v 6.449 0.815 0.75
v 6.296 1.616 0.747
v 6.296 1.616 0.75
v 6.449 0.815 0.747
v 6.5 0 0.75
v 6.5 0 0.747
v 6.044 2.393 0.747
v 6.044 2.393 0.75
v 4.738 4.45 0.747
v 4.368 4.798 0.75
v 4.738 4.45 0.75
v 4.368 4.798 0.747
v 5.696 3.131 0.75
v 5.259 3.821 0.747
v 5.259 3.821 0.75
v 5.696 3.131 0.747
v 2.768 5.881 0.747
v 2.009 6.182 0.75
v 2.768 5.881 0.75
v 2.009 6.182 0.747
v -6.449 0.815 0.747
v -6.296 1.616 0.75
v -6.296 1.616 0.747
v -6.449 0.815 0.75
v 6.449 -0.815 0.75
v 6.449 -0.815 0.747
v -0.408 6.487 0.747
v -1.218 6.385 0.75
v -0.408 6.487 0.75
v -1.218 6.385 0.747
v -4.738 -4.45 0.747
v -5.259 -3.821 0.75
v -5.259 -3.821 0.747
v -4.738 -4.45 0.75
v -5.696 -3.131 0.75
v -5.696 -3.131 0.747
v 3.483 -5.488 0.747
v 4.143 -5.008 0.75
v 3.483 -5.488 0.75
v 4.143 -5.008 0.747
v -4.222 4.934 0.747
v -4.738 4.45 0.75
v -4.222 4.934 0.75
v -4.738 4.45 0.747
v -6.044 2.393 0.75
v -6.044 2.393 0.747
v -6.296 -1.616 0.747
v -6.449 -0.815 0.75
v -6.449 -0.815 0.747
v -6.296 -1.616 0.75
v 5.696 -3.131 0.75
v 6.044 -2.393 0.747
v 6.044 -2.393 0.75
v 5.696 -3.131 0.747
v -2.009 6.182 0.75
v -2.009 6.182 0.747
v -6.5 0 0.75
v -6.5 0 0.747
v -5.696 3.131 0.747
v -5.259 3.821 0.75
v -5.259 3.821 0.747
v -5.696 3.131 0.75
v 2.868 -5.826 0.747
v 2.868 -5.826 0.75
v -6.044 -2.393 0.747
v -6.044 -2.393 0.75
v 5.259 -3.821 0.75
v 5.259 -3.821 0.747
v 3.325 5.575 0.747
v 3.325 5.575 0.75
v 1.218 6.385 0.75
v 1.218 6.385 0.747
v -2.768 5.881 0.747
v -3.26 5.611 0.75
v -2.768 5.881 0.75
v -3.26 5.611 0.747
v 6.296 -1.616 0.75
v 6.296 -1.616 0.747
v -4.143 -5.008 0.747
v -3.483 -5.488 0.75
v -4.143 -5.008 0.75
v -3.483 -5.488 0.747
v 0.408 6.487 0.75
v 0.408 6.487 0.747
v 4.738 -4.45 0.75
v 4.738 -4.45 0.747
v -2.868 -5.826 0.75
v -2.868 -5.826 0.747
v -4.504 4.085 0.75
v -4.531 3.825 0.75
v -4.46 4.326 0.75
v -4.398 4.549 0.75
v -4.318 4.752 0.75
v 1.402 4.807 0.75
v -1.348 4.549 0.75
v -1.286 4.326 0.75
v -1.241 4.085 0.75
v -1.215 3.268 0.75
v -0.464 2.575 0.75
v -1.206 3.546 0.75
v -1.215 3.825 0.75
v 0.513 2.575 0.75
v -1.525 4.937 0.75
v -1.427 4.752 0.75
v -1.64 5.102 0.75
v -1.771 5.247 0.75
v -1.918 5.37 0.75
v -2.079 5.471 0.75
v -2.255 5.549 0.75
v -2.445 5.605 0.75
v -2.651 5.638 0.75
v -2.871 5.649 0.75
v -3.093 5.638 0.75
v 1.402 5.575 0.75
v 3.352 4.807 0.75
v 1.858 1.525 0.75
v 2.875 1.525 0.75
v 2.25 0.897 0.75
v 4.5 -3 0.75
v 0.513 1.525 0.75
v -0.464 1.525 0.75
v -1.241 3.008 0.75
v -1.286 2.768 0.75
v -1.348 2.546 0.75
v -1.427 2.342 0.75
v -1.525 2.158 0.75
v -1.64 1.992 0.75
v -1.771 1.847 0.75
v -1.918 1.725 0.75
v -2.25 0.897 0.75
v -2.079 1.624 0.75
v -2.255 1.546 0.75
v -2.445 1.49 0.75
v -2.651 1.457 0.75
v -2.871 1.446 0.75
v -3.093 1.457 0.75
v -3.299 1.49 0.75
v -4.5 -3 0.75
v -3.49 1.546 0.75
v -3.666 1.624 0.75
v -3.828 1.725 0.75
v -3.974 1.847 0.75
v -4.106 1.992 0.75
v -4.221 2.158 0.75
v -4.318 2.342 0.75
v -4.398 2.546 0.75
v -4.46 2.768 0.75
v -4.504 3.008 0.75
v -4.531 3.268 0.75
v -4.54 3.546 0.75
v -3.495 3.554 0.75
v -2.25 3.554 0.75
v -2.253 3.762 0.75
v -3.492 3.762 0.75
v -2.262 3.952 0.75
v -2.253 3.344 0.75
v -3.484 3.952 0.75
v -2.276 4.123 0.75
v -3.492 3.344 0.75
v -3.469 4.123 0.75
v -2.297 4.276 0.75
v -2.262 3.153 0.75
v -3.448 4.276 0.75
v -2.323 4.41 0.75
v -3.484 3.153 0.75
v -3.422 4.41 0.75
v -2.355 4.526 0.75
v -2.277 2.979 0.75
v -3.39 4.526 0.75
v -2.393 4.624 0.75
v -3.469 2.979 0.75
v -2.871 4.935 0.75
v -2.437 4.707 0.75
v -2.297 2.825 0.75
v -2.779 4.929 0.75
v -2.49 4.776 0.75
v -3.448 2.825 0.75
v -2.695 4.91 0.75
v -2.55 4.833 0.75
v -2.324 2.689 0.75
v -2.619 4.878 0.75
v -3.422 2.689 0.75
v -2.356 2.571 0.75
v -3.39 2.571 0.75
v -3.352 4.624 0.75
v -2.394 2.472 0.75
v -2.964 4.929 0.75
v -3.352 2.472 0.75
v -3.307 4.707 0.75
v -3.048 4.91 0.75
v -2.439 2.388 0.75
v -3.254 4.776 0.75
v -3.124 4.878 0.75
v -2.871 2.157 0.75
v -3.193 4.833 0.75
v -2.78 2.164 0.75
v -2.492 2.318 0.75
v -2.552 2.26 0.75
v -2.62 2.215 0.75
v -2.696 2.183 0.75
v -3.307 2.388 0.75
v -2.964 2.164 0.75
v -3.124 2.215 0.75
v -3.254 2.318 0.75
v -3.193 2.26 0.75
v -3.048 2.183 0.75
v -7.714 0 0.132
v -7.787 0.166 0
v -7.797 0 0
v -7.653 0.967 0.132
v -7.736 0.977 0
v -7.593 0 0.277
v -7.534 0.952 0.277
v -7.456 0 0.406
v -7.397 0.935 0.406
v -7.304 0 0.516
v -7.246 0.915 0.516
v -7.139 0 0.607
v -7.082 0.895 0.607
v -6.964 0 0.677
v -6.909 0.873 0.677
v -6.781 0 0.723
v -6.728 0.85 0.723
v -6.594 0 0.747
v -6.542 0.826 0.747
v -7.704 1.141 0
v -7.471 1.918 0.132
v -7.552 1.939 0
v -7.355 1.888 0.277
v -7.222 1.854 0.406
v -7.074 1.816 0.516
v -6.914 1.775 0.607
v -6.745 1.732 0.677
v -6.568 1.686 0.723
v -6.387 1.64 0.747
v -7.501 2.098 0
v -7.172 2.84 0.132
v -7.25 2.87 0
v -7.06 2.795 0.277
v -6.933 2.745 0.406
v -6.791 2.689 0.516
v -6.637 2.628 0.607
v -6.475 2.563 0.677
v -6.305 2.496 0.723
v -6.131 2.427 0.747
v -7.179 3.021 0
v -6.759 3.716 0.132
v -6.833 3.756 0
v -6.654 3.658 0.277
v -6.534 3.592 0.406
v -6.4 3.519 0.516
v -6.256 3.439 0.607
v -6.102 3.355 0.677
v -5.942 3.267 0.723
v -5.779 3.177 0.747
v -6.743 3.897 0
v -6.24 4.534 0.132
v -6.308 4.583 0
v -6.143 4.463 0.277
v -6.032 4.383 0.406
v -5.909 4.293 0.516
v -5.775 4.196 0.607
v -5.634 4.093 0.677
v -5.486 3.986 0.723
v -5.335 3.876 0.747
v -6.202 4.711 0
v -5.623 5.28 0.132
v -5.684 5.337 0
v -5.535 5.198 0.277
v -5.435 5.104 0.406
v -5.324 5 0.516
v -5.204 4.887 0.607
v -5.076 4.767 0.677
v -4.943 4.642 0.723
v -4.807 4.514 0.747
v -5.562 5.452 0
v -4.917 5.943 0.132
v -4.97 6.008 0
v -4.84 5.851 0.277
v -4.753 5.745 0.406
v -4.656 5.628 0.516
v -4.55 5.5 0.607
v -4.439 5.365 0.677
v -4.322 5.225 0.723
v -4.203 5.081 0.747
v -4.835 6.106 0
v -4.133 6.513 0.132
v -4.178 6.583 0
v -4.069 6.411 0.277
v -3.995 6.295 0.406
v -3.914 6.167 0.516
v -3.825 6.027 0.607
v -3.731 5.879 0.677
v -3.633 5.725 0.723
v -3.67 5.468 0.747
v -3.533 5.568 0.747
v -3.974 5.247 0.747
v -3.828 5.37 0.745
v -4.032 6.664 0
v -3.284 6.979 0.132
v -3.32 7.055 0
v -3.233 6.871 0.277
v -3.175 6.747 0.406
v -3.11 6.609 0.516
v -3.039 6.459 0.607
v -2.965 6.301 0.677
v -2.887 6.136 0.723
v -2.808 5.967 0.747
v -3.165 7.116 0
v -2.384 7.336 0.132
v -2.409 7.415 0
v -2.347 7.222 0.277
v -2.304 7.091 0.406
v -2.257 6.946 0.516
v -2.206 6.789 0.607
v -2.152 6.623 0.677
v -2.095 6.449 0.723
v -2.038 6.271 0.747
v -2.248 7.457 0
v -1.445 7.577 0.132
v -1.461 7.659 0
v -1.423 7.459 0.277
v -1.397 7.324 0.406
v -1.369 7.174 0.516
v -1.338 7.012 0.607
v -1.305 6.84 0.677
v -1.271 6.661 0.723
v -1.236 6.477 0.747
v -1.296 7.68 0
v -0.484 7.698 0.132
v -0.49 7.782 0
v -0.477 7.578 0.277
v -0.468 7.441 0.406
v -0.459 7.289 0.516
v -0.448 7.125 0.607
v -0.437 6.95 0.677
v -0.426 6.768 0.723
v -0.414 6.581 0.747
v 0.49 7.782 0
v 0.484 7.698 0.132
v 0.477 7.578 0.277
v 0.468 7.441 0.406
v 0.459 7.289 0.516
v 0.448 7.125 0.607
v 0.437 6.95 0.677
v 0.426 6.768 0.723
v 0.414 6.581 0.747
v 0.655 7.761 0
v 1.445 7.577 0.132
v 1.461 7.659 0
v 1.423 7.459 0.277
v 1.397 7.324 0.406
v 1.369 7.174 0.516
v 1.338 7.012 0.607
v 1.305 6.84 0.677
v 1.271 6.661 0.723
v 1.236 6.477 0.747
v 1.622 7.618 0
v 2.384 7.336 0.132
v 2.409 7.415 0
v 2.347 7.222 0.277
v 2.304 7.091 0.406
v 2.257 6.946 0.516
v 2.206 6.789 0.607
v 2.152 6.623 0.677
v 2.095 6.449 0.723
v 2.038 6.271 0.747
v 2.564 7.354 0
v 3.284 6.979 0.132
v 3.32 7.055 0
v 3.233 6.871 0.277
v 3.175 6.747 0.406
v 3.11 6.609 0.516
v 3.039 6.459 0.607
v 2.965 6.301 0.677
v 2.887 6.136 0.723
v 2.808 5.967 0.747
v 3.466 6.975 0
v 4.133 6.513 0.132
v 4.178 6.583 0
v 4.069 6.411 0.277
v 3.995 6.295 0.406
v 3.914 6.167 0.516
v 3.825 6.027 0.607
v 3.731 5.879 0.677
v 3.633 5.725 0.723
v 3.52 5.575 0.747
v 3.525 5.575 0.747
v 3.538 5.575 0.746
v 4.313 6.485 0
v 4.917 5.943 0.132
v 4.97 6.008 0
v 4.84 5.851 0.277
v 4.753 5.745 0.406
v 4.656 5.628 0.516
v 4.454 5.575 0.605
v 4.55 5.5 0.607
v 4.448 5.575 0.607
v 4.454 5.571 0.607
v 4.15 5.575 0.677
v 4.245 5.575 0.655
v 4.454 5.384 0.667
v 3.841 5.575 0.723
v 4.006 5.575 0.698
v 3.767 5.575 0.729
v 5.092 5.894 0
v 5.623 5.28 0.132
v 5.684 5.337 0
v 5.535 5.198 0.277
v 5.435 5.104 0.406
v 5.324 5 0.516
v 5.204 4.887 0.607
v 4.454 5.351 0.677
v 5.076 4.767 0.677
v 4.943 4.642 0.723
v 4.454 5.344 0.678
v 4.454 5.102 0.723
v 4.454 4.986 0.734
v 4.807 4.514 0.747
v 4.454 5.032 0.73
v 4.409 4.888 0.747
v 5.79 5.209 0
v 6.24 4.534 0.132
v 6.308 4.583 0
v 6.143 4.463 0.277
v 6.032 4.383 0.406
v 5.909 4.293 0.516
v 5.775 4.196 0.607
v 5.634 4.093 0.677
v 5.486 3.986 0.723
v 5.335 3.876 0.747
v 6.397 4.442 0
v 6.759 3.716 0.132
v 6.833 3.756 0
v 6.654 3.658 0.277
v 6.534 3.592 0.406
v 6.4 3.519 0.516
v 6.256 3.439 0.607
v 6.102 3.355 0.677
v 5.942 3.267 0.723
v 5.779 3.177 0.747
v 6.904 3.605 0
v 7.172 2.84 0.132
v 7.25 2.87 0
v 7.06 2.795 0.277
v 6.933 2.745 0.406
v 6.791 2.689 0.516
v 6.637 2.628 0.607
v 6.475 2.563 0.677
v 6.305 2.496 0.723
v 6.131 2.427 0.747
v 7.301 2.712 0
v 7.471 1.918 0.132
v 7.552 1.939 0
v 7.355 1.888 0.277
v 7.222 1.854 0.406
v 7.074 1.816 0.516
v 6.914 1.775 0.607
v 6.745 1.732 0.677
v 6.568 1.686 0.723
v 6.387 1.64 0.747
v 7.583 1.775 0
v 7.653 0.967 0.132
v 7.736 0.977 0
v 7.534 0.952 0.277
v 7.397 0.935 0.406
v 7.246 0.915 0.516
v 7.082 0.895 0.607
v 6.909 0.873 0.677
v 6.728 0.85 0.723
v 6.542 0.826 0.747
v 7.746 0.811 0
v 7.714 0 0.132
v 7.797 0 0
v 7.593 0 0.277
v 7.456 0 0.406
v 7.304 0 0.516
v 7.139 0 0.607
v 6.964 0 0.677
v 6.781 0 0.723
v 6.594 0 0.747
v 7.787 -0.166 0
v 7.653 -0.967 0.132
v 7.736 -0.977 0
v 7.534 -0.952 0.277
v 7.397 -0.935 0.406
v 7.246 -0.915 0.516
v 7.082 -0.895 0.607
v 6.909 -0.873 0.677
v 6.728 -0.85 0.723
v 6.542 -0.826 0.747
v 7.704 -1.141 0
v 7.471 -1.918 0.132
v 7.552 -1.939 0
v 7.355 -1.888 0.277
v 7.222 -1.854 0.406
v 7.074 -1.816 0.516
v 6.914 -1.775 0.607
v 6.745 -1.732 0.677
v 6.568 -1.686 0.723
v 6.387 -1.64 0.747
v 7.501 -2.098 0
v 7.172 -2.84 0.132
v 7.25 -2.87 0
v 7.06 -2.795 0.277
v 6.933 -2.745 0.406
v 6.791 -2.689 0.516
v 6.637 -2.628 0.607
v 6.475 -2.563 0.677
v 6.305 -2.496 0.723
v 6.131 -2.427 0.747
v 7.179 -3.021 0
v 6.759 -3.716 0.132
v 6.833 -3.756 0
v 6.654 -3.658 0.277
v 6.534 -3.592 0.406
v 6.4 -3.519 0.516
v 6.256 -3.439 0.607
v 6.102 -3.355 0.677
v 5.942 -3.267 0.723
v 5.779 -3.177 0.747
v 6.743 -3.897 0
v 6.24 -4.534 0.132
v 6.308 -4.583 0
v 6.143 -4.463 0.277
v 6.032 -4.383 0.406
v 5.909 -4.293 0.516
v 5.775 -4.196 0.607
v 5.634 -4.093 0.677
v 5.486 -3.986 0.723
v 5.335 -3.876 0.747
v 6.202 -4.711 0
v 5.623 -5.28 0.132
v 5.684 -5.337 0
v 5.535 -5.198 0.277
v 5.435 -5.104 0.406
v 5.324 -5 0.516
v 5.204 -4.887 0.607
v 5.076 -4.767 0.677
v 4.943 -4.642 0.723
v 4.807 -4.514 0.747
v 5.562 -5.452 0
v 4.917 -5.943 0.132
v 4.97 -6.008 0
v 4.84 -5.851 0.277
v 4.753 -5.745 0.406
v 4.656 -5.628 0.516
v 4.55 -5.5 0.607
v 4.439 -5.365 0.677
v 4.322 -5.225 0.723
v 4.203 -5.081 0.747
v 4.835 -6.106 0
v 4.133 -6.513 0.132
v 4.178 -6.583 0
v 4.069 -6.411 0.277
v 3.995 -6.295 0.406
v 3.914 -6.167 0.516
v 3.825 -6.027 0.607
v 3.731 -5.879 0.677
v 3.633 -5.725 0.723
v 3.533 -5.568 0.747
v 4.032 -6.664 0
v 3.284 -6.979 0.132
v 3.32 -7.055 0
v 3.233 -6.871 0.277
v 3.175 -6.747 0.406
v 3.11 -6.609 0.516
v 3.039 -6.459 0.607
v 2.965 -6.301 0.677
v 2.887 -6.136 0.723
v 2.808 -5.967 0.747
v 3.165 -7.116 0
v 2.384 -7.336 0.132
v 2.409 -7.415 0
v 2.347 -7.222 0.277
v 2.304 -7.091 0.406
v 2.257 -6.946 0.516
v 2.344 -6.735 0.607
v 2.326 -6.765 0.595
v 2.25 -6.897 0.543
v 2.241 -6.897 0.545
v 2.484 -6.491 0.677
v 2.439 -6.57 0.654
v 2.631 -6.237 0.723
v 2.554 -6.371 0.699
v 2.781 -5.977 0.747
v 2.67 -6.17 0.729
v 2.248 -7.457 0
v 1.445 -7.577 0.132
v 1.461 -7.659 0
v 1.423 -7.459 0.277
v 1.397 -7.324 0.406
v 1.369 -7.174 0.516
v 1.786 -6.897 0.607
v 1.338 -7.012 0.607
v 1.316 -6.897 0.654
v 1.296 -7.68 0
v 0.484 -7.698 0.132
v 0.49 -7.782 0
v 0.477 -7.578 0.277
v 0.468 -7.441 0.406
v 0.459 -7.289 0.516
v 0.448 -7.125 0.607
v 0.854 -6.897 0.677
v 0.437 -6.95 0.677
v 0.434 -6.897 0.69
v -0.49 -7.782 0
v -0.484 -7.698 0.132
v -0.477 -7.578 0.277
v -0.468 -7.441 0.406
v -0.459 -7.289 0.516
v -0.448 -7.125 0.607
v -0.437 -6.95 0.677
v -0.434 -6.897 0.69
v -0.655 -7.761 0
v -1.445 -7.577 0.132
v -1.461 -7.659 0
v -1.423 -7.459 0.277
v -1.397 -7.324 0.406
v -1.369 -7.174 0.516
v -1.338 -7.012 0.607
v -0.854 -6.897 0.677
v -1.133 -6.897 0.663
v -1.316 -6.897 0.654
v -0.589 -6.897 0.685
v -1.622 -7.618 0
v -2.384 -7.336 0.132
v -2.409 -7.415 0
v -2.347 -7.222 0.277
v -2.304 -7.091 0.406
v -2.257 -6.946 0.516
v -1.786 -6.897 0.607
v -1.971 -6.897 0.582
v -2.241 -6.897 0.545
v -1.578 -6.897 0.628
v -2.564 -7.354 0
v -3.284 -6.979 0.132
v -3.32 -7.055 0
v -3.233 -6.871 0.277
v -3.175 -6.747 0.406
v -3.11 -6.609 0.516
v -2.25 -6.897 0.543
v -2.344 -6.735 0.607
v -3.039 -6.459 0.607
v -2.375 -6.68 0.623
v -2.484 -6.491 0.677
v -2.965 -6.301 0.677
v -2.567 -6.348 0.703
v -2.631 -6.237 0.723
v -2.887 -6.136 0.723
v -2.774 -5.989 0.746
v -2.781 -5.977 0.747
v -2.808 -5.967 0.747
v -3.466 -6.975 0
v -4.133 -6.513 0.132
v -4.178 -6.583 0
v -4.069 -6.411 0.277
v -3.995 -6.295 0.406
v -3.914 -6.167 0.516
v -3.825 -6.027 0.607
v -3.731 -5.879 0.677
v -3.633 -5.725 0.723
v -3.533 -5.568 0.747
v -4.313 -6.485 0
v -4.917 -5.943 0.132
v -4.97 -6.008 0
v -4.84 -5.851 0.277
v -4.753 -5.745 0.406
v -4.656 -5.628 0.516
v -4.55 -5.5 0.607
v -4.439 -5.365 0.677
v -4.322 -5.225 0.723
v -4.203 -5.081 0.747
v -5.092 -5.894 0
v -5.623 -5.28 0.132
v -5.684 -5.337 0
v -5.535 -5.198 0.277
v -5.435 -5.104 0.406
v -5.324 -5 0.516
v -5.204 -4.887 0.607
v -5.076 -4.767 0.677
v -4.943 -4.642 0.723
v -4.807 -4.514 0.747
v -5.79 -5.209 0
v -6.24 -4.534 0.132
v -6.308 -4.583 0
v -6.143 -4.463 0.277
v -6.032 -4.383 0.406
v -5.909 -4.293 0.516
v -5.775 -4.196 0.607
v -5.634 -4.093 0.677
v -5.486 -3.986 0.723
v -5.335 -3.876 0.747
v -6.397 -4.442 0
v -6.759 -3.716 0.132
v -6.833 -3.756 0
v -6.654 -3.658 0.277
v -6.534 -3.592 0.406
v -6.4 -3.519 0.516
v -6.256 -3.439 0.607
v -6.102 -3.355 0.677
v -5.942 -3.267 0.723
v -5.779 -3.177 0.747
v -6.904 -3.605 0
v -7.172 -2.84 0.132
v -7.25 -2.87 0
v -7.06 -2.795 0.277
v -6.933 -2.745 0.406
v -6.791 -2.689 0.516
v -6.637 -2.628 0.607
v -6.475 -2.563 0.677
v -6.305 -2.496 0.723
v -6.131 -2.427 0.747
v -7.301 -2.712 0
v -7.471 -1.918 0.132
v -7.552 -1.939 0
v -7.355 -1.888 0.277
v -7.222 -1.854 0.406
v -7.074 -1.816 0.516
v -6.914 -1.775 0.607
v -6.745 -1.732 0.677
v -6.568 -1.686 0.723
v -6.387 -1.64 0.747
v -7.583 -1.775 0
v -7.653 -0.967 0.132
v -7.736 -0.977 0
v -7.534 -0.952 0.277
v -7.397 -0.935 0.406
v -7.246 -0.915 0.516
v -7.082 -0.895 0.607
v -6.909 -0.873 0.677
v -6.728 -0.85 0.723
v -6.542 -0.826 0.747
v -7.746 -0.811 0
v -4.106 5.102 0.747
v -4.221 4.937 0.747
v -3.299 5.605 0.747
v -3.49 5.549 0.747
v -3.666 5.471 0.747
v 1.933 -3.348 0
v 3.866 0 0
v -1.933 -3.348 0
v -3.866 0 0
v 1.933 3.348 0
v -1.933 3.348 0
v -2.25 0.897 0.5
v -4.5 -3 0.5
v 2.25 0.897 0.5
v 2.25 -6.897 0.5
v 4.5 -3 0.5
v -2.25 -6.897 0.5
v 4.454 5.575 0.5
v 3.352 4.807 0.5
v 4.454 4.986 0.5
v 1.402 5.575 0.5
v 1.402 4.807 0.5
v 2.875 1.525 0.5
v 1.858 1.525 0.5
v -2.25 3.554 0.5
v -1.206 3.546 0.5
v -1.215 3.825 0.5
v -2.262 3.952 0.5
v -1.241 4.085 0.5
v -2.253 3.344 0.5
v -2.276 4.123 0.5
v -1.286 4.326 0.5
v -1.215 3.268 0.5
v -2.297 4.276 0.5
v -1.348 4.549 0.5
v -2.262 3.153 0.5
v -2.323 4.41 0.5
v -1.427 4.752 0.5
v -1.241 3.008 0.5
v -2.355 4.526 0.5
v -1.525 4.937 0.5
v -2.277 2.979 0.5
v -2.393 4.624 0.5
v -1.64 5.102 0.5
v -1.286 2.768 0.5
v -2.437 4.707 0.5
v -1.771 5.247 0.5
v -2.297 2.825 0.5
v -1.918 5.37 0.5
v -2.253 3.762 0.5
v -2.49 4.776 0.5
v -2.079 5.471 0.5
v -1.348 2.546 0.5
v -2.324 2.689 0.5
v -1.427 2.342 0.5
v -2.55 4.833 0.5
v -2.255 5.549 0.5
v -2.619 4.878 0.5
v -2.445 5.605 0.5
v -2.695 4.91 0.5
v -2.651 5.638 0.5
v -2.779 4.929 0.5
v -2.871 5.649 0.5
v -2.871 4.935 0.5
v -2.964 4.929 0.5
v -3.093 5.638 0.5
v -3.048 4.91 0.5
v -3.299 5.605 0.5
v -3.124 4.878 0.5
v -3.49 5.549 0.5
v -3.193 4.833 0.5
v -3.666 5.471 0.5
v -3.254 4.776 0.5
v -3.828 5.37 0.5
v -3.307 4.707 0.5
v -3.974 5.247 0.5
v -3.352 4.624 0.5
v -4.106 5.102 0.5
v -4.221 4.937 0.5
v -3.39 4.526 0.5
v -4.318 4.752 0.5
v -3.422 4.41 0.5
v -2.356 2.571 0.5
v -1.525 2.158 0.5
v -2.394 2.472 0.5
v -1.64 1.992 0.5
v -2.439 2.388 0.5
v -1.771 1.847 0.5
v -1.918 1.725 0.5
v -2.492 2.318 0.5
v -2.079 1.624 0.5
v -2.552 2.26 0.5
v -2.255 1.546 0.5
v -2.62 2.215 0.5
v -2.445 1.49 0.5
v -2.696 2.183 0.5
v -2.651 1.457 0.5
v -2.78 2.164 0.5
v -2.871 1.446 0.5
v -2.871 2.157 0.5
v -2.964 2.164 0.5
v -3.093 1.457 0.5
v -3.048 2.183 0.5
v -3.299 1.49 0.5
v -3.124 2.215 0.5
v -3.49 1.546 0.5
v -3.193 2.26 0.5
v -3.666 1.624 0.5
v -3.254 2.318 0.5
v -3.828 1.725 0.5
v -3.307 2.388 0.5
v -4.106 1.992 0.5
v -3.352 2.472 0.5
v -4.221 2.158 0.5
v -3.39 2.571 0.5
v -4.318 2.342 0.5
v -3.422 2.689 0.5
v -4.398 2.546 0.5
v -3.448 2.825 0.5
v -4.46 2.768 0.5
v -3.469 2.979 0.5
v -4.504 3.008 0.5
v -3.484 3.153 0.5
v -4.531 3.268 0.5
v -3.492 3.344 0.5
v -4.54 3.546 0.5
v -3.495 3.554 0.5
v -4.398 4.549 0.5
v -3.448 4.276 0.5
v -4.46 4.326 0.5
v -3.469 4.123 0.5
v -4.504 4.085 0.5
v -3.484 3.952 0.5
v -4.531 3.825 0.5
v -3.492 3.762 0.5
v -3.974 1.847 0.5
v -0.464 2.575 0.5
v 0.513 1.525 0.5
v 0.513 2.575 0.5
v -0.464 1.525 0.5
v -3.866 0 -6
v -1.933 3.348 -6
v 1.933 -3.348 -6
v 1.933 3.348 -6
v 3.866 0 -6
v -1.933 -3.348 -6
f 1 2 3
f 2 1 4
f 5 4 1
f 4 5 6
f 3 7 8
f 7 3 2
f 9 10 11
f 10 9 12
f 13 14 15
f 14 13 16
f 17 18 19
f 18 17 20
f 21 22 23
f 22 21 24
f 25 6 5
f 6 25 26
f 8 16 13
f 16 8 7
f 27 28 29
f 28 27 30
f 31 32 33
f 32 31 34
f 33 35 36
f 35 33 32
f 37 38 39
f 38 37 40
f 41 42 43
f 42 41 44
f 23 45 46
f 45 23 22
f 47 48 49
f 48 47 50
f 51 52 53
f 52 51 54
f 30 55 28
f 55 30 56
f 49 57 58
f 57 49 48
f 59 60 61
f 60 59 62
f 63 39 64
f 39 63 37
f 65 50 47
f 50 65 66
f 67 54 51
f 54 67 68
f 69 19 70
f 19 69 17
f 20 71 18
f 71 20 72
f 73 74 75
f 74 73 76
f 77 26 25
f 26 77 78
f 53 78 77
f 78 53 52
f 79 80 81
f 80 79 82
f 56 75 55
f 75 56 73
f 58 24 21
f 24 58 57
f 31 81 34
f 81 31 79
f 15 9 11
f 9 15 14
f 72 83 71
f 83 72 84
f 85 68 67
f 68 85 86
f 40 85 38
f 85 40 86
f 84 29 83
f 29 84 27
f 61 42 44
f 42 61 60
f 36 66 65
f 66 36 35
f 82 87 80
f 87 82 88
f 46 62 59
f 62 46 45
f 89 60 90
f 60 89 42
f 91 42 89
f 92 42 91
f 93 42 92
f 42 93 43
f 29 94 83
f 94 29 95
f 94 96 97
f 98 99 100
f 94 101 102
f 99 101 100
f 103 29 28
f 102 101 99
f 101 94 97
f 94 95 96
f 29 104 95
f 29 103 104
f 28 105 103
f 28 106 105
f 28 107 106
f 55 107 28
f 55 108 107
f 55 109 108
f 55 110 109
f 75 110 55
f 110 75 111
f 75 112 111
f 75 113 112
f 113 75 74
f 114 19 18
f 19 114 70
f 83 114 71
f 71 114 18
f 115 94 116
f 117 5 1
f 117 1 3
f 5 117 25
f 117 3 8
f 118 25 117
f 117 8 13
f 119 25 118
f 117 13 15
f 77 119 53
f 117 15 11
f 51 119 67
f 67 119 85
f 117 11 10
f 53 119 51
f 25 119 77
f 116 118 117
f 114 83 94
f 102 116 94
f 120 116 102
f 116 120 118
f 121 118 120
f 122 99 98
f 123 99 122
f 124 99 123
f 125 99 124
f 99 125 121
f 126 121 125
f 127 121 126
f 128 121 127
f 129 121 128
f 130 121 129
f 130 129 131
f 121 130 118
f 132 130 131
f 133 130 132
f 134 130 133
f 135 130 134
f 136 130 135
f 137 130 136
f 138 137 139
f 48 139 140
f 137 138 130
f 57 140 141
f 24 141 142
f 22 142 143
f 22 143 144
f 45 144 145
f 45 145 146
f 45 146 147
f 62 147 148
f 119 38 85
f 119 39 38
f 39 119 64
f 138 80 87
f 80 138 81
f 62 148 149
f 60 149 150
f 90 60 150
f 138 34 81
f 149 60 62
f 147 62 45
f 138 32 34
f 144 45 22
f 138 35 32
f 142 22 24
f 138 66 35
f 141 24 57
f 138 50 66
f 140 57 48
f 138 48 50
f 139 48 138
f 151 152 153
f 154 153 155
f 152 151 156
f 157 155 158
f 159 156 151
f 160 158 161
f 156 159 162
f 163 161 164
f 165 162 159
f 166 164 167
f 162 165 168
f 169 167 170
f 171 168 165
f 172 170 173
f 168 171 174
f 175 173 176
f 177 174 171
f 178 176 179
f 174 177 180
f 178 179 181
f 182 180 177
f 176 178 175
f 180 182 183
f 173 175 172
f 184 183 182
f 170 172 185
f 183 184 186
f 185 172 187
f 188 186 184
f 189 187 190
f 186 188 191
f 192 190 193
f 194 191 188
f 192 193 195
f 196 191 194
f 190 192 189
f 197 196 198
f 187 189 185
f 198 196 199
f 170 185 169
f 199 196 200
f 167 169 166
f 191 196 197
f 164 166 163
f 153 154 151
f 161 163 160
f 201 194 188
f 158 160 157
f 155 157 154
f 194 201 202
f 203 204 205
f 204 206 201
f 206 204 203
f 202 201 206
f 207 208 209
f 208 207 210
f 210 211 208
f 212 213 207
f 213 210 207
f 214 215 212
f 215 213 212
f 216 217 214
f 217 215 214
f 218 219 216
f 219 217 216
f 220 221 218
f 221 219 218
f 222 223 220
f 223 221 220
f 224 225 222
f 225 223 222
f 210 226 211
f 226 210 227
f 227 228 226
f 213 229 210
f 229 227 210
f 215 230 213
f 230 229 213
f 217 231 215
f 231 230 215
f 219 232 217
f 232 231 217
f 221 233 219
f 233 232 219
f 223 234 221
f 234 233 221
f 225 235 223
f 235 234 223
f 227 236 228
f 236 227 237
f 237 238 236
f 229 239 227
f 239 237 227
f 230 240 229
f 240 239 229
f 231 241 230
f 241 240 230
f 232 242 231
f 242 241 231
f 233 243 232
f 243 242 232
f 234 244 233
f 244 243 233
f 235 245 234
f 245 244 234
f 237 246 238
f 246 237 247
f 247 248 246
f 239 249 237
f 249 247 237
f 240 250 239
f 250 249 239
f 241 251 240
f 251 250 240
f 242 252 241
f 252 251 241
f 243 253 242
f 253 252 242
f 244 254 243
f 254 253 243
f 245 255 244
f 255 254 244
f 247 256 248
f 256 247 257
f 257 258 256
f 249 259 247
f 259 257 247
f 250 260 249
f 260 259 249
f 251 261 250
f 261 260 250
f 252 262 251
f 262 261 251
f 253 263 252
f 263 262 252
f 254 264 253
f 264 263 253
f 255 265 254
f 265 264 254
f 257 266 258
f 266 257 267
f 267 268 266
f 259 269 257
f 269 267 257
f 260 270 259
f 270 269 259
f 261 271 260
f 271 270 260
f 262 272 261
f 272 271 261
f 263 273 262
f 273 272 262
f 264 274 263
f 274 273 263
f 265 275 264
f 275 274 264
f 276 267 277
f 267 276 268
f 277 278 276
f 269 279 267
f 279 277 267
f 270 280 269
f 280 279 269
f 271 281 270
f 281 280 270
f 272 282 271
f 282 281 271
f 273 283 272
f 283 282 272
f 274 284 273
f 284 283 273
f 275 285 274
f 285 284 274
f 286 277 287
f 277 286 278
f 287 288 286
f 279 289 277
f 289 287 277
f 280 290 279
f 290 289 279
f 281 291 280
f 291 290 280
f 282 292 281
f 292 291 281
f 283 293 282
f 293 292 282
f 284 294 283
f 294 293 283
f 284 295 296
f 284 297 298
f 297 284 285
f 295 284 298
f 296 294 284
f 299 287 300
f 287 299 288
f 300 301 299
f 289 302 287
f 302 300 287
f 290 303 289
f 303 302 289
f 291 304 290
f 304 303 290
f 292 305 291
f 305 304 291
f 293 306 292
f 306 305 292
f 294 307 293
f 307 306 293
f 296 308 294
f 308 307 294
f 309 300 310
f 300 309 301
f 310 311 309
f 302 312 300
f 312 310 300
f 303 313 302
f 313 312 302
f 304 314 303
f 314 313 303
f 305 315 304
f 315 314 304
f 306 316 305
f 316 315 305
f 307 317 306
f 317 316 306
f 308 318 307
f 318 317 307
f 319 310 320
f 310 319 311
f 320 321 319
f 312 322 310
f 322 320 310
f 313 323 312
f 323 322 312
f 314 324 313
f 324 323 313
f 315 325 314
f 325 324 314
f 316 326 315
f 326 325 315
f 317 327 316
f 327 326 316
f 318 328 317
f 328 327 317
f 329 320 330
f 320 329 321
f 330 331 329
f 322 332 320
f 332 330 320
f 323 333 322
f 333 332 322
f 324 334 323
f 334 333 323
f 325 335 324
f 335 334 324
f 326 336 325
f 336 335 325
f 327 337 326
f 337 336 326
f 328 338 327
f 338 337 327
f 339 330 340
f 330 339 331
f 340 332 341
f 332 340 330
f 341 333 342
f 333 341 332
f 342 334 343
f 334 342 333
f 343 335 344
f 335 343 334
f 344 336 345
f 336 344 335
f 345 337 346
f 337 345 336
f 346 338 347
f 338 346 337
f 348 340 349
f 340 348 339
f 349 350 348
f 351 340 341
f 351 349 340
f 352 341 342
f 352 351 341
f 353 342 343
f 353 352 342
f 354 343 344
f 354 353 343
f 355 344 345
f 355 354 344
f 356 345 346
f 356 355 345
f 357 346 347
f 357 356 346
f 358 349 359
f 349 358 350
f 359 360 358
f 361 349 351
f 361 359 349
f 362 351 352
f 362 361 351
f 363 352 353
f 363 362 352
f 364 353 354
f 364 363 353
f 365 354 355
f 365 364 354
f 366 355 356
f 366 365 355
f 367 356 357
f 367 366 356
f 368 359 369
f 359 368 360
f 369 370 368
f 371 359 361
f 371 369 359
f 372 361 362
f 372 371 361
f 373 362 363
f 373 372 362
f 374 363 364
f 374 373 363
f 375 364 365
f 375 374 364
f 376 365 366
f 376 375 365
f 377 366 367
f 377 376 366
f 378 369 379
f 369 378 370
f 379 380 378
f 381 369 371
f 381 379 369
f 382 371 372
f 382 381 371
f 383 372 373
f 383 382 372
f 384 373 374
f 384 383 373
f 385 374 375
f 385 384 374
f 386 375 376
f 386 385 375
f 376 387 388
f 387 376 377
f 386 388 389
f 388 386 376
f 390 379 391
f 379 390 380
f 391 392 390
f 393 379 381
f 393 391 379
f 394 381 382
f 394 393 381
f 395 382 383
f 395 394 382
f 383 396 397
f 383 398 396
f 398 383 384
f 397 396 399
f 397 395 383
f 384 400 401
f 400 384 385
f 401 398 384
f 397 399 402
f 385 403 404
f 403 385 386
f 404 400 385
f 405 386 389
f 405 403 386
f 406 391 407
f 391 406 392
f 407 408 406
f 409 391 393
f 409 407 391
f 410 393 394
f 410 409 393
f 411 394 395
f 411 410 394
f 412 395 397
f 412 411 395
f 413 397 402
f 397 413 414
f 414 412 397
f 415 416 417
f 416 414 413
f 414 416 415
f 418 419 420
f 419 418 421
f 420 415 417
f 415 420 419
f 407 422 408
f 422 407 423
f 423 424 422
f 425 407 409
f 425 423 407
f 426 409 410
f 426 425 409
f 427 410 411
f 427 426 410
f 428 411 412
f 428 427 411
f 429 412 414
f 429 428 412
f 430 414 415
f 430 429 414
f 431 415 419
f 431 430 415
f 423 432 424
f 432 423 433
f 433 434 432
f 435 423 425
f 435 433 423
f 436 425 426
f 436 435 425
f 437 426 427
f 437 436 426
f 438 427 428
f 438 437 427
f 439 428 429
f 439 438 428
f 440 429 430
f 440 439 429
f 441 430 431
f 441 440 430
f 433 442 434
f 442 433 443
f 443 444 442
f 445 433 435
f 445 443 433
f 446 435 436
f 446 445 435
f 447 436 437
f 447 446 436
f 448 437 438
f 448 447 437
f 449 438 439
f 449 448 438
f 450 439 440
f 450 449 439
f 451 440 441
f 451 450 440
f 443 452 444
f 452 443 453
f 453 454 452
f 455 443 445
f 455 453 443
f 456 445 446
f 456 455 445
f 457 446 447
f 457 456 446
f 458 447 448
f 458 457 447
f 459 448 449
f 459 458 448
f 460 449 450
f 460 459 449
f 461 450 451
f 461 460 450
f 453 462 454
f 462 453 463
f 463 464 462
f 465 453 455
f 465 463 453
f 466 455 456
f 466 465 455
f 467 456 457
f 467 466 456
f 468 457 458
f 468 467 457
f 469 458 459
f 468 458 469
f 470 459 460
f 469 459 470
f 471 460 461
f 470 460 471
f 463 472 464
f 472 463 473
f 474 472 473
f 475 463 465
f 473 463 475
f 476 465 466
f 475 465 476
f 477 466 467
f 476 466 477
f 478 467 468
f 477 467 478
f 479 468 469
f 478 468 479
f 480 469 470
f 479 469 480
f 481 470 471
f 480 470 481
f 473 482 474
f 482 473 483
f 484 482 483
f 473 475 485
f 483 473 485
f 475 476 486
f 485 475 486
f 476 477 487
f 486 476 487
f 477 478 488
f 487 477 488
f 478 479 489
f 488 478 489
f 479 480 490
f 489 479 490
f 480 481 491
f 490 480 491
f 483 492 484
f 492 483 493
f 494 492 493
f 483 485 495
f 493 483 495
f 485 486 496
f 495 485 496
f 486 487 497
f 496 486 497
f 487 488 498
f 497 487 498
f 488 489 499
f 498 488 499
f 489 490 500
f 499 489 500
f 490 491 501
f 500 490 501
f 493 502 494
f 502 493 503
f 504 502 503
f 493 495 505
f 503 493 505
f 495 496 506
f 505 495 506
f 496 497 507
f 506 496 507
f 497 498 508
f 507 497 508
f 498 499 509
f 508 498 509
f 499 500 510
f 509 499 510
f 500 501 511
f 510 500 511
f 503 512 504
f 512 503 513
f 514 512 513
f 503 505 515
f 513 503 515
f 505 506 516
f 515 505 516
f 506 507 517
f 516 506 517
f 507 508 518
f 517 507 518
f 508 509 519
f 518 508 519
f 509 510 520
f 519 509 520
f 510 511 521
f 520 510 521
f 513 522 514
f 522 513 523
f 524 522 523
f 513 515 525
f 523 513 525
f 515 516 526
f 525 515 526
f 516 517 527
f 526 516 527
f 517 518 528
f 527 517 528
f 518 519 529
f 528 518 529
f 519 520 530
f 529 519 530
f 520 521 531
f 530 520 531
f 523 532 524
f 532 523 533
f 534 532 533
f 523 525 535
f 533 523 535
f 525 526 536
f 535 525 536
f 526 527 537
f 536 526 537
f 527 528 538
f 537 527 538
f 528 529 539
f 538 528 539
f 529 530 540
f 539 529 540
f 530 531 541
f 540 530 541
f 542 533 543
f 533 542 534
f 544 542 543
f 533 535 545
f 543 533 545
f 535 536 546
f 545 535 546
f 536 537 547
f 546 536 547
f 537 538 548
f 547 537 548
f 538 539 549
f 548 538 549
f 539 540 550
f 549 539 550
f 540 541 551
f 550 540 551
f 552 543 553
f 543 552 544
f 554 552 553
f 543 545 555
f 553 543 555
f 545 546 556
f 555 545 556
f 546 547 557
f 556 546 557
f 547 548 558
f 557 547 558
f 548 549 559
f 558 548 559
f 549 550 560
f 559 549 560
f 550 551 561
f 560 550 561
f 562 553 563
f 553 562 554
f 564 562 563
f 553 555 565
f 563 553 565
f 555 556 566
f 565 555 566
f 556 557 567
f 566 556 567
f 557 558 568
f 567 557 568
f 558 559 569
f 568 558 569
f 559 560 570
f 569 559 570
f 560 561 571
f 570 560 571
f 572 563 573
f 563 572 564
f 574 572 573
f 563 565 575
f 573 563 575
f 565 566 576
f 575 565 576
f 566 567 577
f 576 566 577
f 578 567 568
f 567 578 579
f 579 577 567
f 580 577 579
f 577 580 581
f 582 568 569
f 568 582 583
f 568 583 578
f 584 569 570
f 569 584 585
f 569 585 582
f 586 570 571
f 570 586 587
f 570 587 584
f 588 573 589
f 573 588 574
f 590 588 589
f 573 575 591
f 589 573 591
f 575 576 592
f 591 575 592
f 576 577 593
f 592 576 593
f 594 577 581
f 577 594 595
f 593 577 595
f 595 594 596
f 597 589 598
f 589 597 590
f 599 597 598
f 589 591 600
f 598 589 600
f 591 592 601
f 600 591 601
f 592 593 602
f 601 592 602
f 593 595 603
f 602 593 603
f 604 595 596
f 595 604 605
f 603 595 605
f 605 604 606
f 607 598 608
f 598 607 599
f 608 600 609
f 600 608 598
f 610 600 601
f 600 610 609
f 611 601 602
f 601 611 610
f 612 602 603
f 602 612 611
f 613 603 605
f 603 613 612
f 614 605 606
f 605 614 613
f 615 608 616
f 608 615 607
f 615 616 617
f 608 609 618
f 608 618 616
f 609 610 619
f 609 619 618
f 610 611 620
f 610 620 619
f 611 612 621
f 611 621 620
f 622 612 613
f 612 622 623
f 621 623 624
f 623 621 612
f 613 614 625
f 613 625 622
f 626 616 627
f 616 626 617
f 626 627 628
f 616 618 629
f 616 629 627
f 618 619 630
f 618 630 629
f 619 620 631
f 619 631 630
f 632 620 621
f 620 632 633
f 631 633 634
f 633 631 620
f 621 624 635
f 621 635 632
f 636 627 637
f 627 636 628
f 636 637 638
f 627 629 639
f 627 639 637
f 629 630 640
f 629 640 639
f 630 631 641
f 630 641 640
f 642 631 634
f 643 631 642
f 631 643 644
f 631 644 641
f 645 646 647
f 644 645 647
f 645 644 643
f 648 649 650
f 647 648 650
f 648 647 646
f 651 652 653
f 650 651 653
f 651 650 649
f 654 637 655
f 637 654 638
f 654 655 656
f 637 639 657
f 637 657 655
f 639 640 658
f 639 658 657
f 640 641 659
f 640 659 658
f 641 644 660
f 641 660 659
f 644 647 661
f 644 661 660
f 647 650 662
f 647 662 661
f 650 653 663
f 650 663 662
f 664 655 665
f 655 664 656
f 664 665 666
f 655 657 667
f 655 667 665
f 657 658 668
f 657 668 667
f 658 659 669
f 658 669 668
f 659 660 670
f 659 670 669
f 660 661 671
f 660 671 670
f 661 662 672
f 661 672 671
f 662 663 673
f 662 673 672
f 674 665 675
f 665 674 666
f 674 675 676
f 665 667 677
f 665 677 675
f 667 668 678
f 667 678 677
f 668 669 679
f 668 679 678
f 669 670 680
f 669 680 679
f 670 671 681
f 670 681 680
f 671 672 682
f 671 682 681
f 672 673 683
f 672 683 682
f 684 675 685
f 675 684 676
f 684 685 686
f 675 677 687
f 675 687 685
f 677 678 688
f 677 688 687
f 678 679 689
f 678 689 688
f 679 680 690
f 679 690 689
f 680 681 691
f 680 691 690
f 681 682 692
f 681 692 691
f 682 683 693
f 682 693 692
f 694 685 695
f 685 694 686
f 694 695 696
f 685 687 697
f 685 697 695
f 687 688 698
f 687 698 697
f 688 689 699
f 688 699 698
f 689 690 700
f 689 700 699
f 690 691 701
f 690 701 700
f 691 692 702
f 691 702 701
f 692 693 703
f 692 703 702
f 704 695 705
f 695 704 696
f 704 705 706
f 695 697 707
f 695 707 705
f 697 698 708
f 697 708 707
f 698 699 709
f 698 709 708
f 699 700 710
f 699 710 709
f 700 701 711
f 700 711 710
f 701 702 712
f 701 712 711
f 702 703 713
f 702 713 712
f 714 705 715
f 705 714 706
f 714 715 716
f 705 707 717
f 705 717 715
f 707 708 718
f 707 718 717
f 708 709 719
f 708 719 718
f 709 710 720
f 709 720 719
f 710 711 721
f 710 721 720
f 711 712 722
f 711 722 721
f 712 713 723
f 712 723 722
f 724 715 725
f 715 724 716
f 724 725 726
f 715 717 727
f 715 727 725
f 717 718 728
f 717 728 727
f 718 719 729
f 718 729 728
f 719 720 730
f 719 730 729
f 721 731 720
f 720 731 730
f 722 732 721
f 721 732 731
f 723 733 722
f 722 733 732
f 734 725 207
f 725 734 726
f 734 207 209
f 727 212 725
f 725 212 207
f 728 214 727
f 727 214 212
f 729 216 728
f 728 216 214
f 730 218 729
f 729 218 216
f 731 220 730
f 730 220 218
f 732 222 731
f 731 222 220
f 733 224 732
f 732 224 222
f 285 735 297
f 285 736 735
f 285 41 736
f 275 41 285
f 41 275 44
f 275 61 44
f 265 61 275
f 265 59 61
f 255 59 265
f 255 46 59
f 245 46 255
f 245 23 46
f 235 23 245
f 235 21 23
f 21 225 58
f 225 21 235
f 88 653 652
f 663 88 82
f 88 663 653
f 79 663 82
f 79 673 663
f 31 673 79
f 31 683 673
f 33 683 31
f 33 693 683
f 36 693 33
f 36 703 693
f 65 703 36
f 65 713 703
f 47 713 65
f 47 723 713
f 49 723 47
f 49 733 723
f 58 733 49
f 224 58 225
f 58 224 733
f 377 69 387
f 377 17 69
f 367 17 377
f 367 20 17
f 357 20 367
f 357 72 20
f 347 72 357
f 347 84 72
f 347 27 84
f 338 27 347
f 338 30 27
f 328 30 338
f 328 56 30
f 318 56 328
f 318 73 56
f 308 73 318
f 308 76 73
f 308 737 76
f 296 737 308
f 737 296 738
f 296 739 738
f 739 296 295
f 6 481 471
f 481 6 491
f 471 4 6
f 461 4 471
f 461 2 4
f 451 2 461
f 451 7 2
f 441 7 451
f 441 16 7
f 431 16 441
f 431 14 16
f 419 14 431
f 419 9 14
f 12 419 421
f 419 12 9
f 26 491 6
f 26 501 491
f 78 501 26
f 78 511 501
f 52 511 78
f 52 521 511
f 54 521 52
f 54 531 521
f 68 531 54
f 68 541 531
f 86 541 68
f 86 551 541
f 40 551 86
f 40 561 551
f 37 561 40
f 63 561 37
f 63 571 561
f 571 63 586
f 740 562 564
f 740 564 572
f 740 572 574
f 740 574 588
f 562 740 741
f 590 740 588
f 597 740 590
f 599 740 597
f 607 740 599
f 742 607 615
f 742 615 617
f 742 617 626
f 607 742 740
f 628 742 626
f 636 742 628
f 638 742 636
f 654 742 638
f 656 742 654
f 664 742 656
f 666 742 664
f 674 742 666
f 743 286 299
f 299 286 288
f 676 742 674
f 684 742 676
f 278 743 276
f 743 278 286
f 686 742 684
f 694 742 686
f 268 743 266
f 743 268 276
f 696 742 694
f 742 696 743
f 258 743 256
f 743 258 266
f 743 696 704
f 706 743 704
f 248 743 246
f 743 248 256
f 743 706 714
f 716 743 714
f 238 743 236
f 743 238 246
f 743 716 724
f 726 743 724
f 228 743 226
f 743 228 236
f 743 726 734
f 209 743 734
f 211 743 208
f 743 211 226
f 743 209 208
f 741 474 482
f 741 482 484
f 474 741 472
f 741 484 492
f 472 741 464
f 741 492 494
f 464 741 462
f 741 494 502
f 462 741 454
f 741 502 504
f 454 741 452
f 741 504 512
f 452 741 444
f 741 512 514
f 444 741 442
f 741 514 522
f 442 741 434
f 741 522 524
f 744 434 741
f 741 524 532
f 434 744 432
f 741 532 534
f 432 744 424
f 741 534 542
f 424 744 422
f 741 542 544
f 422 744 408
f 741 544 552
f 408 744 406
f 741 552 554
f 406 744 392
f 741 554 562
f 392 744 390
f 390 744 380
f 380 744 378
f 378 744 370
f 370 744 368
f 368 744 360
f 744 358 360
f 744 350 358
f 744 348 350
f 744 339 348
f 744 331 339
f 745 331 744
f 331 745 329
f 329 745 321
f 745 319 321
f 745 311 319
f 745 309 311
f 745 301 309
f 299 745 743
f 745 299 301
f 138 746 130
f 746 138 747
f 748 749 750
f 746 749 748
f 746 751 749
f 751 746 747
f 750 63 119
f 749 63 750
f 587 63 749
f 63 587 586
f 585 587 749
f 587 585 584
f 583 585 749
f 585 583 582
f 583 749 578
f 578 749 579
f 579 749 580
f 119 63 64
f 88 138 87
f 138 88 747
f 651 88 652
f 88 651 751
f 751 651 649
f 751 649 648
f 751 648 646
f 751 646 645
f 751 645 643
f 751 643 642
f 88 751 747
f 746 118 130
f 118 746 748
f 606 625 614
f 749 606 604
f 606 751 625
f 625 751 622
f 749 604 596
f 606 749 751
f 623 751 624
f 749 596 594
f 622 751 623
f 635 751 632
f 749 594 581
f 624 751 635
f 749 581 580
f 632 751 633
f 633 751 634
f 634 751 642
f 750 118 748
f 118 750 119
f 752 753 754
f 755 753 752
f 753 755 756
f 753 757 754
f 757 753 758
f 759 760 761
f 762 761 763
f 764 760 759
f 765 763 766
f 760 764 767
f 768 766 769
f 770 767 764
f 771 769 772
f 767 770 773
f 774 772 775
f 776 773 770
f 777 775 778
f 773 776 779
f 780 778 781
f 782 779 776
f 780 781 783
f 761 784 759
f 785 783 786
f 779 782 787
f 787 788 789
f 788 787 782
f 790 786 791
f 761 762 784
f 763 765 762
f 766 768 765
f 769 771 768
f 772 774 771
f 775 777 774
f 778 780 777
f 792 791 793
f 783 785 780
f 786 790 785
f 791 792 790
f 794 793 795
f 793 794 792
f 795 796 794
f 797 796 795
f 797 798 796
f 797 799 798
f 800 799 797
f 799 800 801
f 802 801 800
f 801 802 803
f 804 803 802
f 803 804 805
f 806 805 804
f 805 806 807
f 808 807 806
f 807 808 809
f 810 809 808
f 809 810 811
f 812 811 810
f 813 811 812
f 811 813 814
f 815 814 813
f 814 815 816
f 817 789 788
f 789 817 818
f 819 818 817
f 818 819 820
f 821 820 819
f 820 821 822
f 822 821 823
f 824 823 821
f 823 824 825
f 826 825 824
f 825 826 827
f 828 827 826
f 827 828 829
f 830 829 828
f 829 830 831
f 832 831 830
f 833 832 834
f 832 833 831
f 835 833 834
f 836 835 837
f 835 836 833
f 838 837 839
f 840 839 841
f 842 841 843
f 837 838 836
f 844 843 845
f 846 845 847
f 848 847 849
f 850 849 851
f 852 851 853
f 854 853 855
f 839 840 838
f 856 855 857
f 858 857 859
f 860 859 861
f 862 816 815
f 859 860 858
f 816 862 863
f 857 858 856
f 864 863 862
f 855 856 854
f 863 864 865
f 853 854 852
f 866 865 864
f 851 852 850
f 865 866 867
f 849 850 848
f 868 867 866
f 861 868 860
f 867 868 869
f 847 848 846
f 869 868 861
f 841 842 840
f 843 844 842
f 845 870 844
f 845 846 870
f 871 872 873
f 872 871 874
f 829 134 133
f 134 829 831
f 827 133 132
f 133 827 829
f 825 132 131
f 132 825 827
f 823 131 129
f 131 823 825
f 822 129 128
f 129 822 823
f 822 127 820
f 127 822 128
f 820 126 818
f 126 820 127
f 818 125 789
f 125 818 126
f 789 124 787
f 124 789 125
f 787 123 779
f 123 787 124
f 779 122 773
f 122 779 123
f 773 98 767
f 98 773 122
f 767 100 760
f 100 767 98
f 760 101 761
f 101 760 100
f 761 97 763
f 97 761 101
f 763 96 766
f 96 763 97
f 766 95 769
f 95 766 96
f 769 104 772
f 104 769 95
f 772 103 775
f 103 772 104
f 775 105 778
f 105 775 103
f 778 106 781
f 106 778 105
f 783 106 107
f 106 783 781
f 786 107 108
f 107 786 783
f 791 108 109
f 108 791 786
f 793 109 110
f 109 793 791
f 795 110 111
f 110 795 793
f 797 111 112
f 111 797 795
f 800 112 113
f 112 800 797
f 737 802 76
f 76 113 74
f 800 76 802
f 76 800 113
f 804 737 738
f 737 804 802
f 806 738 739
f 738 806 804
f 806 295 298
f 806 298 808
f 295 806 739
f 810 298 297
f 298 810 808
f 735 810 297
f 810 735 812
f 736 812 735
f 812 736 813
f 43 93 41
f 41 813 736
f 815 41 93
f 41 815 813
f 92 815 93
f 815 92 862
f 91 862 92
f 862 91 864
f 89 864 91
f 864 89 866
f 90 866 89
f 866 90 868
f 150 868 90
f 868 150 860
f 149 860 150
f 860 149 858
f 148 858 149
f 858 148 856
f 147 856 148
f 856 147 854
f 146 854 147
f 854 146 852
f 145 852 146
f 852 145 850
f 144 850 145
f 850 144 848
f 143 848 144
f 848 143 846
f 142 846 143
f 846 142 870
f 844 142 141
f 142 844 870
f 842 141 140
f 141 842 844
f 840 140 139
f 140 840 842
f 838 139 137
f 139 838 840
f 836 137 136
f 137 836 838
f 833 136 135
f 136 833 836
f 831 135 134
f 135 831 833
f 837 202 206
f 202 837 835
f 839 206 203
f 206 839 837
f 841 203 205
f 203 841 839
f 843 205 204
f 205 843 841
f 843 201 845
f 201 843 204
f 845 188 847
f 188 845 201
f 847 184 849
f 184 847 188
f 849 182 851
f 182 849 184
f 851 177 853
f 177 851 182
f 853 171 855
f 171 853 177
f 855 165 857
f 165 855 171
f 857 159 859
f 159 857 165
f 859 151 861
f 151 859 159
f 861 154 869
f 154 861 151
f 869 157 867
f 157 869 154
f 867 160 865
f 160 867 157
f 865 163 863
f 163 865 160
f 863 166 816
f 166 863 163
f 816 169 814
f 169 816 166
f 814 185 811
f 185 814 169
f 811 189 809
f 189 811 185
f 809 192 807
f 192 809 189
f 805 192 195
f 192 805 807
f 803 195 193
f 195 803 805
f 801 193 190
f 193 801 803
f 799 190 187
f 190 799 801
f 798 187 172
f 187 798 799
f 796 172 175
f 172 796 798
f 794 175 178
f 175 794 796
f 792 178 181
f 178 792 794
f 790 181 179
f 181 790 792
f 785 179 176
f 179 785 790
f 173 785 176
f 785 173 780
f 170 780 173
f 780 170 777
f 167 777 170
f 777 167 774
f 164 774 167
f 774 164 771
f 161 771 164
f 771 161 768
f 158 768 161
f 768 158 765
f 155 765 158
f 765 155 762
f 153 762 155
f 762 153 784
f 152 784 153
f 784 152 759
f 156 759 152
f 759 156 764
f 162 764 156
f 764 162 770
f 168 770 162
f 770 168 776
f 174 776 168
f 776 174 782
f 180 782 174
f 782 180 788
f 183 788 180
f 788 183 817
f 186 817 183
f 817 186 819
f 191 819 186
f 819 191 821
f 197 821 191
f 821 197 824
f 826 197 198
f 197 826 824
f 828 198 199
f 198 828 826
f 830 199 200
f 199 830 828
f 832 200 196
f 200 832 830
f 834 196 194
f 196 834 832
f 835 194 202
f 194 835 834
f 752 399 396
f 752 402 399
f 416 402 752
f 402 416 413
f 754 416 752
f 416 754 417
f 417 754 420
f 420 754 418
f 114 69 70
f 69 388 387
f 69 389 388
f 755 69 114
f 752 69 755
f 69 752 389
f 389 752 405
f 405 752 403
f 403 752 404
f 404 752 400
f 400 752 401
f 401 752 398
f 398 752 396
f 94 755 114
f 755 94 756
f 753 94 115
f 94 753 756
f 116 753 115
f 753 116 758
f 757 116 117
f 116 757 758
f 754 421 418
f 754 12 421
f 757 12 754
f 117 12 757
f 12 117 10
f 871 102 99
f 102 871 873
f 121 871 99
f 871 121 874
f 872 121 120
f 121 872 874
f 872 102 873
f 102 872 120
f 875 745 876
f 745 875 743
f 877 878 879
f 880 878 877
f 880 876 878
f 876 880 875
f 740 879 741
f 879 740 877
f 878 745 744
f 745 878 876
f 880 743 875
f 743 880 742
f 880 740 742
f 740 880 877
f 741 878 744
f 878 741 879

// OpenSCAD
$fn = 50;


union() {
	difference() {
		union() {
			translate(v = [0, 0, -0.7500000000]) {
				cylinder(h = 1.5000000000, r = 6.5000000000);
			}
			translate(v = [0, 0, -0.7500000000]) {
				rotate_extrude(angle = 360) {
					translate(v = [6.5000000000, 0, 0]) {
						circle(r = 1.5000000000);
					}
				}
			}
		}
		union() {
			translate(v = [-25.0000000000, -25.0000000000, -50]) {
				cube(size = [50, 50, 50]);
			}
			translate(v = [0, -3, 0.5000000000]) {
				#linear_extrude(height = 0.2500000000) {
					polygon(points = [[4.5000000000, 0.0000000000], [2.2500000000, 3.8971143170], [-2.2500000000, 3.8971143170], [-4.5000000000, 0.0000000000], [-2.2500000000, -3.8971143170], [2.2500000000, -3.8971143170]]);
				}
			}
			#translate(v = [0, 3.5000000000, 0.5000000000]) {
				linear_extrude(height = 0.2500000000) {
					text(font = "SegoiUI:Bold", halign = "center", size = 4, text = "0.7", valign = "center");
				}
			}
		}
	}
	union() {
		translate(v = [0, 0, -6]) {
			linear_extrude(height = 6) {
				polygon(points = [[3.8658550000, 0.0000000000], [1.9329275000, 3.3479286373], [-1.9329275000, 3.3479286373], [-3.8658550000, 0.0000000000], [-1.9329275000, -3.3479286373], [1.9329275000, -3.3479286373]]);
			}
		}
	}
}
